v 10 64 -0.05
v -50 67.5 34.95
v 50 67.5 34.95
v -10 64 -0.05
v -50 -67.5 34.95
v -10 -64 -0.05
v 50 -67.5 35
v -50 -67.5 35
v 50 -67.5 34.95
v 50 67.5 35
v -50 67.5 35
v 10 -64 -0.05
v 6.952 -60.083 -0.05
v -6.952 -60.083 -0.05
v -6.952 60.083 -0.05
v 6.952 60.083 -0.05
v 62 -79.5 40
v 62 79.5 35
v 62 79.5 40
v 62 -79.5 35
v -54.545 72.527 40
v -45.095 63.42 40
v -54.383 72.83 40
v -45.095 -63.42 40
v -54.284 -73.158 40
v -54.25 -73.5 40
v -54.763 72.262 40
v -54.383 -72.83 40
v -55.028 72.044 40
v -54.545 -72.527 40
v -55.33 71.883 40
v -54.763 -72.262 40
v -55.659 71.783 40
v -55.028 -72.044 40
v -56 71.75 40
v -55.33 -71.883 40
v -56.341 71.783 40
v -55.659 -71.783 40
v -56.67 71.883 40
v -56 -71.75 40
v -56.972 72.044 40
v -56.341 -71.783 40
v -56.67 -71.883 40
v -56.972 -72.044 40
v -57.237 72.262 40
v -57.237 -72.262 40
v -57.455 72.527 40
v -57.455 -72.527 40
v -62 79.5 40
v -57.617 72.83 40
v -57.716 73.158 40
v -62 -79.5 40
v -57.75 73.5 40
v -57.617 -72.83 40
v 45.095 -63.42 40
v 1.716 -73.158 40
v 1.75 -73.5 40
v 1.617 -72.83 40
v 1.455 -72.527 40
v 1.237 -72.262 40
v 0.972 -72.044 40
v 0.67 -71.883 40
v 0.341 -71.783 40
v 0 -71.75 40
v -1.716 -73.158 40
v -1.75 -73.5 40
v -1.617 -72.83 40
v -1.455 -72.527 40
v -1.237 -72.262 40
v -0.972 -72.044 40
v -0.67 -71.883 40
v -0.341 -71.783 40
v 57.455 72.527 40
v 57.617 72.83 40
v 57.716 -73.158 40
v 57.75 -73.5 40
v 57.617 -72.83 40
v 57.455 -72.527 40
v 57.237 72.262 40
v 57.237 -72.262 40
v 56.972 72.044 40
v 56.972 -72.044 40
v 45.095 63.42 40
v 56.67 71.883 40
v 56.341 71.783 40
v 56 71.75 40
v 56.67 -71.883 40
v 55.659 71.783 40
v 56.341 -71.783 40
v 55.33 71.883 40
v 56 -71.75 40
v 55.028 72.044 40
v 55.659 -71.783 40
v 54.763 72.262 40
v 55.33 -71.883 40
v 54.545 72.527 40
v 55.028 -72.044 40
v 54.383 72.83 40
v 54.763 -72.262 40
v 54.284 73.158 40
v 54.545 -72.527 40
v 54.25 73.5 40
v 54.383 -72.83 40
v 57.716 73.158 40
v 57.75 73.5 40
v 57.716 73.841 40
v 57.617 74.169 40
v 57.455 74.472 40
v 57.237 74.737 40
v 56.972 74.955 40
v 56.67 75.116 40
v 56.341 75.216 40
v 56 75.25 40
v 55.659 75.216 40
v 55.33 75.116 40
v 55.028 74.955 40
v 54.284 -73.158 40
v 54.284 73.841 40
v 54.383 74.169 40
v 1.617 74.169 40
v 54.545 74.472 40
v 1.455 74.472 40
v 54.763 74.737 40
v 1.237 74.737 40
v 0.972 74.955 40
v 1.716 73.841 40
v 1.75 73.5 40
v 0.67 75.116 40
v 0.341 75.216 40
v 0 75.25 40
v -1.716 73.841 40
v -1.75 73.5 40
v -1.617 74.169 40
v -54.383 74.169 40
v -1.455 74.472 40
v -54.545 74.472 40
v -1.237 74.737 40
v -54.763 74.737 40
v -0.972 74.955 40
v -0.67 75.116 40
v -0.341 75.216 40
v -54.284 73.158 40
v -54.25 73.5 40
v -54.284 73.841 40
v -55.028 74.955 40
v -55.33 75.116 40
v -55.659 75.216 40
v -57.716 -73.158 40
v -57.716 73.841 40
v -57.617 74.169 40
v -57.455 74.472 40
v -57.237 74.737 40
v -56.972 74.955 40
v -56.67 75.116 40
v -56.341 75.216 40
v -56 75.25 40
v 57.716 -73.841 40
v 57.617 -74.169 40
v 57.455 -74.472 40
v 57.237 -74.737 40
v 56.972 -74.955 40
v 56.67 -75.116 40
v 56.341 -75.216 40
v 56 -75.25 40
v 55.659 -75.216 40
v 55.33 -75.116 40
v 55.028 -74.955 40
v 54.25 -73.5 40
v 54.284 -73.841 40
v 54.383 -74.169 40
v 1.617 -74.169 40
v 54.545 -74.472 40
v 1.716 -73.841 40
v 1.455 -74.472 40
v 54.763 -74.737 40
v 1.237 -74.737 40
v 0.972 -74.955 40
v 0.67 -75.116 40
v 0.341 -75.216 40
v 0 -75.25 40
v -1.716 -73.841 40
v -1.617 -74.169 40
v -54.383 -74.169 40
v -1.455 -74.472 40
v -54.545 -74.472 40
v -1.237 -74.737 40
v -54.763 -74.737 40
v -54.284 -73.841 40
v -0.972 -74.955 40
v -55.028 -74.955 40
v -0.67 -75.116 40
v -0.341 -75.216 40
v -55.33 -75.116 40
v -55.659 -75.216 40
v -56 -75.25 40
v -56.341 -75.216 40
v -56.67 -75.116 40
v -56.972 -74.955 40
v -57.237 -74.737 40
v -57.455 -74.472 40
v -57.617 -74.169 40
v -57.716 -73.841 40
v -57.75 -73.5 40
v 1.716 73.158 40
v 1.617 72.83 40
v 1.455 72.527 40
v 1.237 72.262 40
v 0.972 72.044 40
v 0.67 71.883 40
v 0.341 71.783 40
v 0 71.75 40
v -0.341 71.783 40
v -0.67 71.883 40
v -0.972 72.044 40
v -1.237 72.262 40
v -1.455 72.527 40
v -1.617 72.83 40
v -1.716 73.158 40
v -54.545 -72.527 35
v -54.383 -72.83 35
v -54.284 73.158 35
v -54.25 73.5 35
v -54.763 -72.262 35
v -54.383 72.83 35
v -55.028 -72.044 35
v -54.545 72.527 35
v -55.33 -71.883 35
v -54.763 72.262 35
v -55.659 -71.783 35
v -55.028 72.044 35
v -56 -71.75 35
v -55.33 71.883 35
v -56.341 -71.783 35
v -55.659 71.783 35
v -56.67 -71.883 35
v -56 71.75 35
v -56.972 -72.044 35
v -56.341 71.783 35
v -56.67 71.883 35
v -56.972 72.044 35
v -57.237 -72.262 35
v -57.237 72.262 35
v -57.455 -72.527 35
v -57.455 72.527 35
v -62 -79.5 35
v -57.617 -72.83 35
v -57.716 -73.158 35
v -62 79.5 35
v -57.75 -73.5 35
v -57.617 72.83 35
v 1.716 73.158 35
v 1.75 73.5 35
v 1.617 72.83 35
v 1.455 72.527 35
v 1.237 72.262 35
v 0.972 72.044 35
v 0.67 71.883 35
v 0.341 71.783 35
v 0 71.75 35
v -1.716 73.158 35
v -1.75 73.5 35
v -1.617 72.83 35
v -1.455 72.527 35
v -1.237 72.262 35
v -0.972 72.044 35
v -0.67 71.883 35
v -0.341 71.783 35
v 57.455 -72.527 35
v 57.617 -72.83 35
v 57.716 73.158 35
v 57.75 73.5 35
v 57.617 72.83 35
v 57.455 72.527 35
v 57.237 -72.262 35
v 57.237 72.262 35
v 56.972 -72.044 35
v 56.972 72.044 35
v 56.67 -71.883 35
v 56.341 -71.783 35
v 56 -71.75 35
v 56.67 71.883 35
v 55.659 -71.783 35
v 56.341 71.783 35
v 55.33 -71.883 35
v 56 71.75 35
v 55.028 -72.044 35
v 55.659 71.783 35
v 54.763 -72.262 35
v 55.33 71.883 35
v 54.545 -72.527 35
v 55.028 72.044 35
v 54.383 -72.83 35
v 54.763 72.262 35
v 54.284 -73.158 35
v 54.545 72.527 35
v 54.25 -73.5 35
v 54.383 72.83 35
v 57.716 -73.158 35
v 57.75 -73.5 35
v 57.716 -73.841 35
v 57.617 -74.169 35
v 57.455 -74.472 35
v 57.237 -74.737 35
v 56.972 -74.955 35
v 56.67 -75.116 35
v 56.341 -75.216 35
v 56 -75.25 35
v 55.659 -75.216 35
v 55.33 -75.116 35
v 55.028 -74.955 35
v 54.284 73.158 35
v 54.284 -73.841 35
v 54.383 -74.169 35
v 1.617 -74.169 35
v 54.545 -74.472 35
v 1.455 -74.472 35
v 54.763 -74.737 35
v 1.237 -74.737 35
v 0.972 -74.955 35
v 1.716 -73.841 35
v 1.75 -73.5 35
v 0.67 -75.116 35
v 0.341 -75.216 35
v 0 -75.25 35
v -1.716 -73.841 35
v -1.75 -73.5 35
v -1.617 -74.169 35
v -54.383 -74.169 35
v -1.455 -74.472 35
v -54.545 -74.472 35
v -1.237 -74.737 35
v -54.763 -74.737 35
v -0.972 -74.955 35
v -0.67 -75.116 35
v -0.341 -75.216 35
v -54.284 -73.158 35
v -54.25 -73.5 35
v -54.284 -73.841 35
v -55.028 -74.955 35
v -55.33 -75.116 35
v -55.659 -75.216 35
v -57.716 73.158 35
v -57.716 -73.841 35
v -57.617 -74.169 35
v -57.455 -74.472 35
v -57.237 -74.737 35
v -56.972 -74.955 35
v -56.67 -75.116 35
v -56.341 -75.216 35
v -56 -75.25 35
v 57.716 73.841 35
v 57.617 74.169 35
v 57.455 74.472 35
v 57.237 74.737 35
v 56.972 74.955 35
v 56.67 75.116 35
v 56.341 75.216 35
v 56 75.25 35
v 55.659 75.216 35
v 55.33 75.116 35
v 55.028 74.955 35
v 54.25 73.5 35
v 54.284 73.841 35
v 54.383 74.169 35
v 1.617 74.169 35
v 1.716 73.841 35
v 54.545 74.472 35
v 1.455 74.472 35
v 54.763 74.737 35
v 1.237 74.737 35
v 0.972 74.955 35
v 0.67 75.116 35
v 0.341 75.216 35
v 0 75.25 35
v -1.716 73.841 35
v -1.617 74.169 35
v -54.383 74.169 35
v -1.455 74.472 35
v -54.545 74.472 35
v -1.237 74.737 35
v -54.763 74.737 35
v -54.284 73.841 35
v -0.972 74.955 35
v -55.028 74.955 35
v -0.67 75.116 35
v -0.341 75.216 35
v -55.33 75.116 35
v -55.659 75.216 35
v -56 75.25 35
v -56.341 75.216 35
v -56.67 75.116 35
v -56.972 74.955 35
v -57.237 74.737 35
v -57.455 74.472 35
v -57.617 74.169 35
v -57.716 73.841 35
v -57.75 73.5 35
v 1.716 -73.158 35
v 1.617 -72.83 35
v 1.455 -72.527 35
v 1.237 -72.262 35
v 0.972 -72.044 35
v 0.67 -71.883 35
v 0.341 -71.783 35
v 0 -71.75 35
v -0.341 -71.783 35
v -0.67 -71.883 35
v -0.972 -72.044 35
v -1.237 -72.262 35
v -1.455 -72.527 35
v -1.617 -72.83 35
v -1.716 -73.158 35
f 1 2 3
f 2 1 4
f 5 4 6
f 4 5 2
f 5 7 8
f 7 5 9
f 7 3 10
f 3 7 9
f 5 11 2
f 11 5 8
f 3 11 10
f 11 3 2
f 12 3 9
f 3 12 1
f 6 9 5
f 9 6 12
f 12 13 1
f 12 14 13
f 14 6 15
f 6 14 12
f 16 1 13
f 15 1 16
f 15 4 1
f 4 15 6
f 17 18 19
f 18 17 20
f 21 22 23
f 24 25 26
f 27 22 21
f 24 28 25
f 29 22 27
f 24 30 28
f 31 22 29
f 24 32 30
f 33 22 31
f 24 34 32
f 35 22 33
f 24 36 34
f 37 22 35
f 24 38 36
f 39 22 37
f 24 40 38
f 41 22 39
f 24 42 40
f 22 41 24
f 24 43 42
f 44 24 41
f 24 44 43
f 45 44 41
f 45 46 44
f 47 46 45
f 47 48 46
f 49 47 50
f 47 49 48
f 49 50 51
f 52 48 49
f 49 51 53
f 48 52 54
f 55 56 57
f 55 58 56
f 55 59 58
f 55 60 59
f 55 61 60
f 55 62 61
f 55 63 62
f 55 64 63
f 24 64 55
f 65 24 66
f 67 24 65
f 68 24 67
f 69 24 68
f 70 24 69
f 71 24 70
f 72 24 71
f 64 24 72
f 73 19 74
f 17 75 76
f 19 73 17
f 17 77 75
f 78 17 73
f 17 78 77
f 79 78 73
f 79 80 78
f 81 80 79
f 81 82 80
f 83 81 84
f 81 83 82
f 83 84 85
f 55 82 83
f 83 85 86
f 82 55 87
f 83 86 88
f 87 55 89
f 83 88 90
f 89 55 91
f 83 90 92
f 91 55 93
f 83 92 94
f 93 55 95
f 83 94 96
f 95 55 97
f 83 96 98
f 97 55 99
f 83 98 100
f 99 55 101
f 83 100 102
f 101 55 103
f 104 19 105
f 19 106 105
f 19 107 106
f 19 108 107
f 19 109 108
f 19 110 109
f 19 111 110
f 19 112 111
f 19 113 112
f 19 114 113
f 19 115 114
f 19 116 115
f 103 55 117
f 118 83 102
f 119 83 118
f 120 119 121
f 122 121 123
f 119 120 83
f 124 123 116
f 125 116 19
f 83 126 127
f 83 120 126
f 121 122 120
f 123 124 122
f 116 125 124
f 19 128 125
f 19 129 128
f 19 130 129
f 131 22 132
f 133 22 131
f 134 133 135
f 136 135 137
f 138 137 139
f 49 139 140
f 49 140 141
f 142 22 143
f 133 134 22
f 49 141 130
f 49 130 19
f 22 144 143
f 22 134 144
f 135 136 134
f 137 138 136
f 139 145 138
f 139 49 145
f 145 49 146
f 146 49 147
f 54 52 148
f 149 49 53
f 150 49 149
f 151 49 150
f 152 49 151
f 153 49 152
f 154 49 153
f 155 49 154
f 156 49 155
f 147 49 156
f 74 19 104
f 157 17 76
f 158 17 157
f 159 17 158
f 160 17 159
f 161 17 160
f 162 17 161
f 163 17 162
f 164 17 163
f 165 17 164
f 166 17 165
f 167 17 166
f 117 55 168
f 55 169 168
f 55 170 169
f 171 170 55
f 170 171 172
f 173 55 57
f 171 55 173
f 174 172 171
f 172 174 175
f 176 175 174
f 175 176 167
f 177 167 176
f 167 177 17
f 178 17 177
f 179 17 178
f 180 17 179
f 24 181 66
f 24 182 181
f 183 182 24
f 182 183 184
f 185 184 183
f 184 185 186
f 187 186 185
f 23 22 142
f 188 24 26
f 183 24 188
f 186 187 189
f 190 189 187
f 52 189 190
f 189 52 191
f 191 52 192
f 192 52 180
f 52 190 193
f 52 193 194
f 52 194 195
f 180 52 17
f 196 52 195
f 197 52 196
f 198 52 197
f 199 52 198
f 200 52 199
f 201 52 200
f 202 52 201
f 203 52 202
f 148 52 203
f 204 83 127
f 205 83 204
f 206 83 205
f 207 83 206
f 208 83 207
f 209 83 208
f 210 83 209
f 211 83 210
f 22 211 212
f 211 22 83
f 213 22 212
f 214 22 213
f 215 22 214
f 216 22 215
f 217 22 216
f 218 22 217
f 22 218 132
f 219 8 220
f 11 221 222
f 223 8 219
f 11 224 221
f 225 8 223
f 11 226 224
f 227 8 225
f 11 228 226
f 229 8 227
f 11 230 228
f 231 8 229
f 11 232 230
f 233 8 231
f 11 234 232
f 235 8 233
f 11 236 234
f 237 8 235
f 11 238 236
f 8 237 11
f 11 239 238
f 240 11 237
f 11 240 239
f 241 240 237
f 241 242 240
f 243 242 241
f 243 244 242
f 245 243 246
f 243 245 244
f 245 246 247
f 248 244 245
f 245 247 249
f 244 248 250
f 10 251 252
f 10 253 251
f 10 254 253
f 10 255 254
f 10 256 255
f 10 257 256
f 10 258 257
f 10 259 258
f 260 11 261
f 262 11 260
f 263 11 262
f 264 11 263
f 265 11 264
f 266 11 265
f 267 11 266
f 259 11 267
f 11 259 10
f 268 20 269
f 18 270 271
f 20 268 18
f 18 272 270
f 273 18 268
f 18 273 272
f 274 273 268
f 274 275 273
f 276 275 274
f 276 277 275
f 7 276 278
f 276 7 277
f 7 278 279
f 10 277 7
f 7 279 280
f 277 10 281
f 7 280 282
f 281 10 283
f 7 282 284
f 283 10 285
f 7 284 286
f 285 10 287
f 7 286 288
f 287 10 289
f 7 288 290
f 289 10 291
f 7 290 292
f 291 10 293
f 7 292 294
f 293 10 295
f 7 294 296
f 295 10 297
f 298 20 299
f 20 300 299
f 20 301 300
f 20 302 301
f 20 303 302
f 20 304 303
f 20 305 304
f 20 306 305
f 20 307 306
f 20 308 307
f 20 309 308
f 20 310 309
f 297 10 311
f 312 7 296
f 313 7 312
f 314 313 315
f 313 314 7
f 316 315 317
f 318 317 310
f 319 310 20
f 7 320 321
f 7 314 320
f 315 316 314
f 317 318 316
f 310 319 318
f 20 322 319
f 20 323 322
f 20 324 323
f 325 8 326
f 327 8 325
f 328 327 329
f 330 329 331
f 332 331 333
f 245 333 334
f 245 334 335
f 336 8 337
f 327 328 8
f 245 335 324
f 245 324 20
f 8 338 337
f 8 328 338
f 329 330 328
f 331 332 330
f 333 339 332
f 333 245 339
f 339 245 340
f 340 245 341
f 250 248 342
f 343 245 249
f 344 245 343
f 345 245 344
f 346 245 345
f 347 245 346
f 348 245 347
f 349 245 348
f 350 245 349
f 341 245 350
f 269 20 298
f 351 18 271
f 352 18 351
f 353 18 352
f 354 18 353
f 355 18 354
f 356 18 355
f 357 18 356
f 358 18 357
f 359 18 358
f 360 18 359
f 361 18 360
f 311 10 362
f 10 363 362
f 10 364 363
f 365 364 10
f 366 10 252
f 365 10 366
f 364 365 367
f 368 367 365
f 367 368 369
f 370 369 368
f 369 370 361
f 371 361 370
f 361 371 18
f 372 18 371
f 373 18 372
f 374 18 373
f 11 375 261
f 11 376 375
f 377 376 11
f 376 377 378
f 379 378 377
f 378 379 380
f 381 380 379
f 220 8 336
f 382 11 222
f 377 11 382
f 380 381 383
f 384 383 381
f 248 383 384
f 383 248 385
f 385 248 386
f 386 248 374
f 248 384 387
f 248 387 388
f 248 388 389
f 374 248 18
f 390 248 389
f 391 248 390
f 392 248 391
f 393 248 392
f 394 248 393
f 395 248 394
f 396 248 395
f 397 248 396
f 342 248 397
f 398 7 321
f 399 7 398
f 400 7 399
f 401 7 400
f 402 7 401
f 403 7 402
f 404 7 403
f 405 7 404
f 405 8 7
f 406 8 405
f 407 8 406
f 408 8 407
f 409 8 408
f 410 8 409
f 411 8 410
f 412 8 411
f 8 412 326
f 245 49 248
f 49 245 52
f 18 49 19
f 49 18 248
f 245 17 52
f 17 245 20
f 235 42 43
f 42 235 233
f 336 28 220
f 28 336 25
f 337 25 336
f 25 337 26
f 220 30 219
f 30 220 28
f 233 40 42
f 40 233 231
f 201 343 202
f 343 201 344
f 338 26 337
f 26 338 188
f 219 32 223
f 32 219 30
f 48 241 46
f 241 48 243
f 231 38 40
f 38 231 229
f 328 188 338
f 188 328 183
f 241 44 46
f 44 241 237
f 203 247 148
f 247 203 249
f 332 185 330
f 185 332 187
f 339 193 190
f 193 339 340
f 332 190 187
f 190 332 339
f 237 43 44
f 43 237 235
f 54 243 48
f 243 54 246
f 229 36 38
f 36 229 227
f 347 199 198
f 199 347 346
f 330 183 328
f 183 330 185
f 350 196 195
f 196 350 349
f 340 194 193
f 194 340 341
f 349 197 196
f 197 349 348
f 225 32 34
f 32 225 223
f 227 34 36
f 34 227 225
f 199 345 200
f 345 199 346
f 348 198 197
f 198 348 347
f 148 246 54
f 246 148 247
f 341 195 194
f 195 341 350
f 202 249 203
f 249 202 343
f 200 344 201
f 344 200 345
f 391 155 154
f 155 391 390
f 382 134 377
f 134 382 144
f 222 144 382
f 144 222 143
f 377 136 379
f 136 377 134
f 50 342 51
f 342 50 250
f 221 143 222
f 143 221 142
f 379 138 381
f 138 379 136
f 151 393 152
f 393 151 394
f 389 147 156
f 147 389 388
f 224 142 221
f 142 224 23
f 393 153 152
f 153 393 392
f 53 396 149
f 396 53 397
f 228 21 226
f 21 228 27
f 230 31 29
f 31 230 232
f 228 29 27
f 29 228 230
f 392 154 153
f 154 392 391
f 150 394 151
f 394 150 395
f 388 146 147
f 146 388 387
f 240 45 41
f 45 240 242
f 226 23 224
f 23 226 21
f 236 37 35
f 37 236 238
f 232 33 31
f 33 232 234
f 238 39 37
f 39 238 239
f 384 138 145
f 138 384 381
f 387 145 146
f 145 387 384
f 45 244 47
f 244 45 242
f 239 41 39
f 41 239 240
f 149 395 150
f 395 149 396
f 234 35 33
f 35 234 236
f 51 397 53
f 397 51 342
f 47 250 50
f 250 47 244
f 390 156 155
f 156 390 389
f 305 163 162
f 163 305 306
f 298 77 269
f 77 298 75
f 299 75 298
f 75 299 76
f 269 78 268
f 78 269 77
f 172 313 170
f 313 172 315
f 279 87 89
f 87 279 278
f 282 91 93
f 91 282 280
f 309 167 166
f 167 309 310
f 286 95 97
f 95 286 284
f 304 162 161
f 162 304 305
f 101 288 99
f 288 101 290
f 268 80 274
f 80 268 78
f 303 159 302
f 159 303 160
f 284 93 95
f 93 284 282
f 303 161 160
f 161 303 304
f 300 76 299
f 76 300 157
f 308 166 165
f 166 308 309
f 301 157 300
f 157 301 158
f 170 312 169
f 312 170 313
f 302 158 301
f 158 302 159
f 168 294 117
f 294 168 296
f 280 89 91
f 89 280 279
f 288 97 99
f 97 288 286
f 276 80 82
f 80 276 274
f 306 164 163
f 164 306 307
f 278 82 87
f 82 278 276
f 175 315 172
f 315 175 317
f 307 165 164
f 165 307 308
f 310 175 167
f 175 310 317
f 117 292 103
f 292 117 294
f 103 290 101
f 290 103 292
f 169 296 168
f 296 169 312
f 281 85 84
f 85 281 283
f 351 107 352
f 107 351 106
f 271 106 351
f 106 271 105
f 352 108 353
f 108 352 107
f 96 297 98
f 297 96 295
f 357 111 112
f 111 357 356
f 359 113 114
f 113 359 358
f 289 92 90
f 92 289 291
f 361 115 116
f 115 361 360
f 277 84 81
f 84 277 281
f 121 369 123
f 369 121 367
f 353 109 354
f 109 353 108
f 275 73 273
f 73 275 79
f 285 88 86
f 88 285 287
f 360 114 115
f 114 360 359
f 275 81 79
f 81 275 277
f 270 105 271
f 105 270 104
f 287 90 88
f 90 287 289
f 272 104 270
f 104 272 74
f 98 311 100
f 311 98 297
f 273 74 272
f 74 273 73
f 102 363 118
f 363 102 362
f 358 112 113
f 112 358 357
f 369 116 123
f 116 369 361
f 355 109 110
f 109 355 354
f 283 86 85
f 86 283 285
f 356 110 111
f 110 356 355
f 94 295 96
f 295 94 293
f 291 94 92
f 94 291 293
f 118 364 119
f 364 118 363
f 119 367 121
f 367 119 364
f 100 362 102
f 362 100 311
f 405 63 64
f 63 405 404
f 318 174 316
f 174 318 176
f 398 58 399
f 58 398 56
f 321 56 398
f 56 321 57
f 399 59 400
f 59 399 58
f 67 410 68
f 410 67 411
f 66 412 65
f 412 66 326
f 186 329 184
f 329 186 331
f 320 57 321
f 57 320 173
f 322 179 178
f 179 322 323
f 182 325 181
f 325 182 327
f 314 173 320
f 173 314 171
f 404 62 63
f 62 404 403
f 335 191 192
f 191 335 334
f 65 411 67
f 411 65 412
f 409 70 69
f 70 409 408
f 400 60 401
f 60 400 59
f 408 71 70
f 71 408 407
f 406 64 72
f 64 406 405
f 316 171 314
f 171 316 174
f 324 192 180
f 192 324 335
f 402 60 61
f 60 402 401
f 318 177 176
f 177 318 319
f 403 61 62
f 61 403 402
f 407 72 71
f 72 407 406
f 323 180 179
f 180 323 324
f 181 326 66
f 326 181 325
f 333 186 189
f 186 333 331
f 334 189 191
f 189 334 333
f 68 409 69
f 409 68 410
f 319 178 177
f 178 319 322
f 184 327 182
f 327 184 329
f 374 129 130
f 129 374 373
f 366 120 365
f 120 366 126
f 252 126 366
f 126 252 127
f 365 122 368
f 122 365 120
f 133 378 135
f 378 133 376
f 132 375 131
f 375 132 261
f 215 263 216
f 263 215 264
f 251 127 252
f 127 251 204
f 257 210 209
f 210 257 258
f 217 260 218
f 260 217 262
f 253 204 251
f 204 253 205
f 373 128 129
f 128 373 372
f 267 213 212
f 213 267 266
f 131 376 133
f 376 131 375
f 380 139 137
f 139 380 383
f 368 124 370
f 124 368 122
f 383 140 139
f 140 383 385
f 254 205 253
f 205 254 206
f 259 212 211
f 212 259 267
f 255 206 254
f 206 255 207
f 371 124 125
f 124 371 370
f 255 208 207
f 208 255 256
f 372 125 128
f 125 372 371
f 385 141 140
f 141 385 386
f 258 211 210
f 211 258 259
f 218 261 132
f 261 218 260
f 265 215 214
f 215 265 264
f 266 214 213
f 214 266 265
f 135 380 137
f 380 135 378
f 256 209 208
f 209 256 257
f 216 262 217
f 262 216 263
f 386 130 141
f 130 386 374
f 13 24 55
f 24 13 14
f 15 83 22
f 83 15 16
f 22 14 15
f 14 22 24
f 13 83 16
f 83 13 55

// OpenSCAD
// ==============================================================================
// OpenSCAD Parametric Waveguide (Horn) Generator
// Designed for 120mm Ribbon Tweeter (PA Outdoor Line Array)
// Dispersion: 90 degrees Horizontal x 10 degrees Vertical
// ==============================================================================

// --- PARAMETERS (All dimensions in mm) ---
throat_width   = 12.0;    // Horizontal throat width (matches magnet gap)
throat_height  = 120.0;   // Vertical throat height (matches ribbon length)
horn_depth     = 40.0;    // Horn depth along Z axis

angle_h        = 90.0;    // Horizontal dispersion angle (degrees)
angle_v        = 10.0;    // Vertical dispersion angle (degrees)

wall_thickness = 4.0;     // Shell wall thickness (for PETG-CF / ABS)
flange_width   = 12.0;    // Mounting flange overhang width
flange_thick   = 5.0;     // Mounting flange thickness

hole_diameter  = 3.5;     // Mounting hole size (M3 screws)
fn_quality     = 32;      // Mesh resolution ($fn)

// --- DERIVED CALCULATIONS ---
half_angle_h = angle_h / 2.0;
half_angle_v = angle_v / 2.0;

mouth_width  = throat_width  + 2.0 * horn_depth * tan(half_angle_h);
mouth_height = throat_height + 2.0 * horn_depth * tan(half_angle_v);

// --- MODULE DEFINITION ---
module ribbon_waveguide() {
    difference() {
        // Outer solid shape (body + flange)
        union() {
            // Main expanding horn body
            hull() {
                // Throat outer footprint at z = 0
                translate([0, 0, 0])
                    cube([throat_width + 2*wall_thickness, throat_height + 2*wall_thickness, 0.1], center=true);

                // Mouth outer footprint at z = horn_depth - flange_thick
                translate([0, 0, horn_depth - flange_thick])
                    cube([mouth_width + 2*wall_thickness, mouth_height + 2*wall_thickness, 0.1], center=true);
            }

            // Mounting flange at front mouth
            translate([0, 0, horn_depth - flange_thick/2])
                cube([mouth_width + 2*wall_thickness + 2*flange_width,
                      mouth_height + 2*wall_thickness + 2*flange_width,
                      flange_thick], center=true);
        }

        // Inner acoustic horn cutout (hollow expansion path)
        hull() {
            // Throat inner opening at z = -1 (extra length for clean boolean subtract)
            translate([0, 0, -1])
                cube([throat_width, throat_height, 0.1], center=true);

            // Mouth inner opening at z = horn_depth + 1
            translate([0, 0, horn_depth + 1])
                cube([mouth_width, mouth_height, 0.1], center=true);
        }

        // M3 Mounting holes in the flange (4 corners + 2 middle)
        hole_x = (mouth_width / 2) + wall_thickness + (flange_width / 2);
        hole_y = (mouth_height / 2) + wall_thickness + (flange_width / 2);

        // Corner mounting holes
        for (sx = [-1, 1]) {
            for (sy = [-1, 1]) {
                translate([sx * hole_x, sy * hole_y, horn_depth - flange_thick - 1])
                    cylinder(d=hole_diameter, h=flange_thick + 3, $fn=fn_quality);
            }
        }

        // Center-top and center-bottom mounting holes for long array
        for (sy = [-1, 1]) {
            translate([0, sy * hole_y, horn_depth - flange_thick - 1])
                cylinder(d=hole_diameter, h=flange_thick + 3, $fn=fn_quality);
        }
    }
}

// --- RENDER GEOMETRY ---
ribbon_waveguide();
